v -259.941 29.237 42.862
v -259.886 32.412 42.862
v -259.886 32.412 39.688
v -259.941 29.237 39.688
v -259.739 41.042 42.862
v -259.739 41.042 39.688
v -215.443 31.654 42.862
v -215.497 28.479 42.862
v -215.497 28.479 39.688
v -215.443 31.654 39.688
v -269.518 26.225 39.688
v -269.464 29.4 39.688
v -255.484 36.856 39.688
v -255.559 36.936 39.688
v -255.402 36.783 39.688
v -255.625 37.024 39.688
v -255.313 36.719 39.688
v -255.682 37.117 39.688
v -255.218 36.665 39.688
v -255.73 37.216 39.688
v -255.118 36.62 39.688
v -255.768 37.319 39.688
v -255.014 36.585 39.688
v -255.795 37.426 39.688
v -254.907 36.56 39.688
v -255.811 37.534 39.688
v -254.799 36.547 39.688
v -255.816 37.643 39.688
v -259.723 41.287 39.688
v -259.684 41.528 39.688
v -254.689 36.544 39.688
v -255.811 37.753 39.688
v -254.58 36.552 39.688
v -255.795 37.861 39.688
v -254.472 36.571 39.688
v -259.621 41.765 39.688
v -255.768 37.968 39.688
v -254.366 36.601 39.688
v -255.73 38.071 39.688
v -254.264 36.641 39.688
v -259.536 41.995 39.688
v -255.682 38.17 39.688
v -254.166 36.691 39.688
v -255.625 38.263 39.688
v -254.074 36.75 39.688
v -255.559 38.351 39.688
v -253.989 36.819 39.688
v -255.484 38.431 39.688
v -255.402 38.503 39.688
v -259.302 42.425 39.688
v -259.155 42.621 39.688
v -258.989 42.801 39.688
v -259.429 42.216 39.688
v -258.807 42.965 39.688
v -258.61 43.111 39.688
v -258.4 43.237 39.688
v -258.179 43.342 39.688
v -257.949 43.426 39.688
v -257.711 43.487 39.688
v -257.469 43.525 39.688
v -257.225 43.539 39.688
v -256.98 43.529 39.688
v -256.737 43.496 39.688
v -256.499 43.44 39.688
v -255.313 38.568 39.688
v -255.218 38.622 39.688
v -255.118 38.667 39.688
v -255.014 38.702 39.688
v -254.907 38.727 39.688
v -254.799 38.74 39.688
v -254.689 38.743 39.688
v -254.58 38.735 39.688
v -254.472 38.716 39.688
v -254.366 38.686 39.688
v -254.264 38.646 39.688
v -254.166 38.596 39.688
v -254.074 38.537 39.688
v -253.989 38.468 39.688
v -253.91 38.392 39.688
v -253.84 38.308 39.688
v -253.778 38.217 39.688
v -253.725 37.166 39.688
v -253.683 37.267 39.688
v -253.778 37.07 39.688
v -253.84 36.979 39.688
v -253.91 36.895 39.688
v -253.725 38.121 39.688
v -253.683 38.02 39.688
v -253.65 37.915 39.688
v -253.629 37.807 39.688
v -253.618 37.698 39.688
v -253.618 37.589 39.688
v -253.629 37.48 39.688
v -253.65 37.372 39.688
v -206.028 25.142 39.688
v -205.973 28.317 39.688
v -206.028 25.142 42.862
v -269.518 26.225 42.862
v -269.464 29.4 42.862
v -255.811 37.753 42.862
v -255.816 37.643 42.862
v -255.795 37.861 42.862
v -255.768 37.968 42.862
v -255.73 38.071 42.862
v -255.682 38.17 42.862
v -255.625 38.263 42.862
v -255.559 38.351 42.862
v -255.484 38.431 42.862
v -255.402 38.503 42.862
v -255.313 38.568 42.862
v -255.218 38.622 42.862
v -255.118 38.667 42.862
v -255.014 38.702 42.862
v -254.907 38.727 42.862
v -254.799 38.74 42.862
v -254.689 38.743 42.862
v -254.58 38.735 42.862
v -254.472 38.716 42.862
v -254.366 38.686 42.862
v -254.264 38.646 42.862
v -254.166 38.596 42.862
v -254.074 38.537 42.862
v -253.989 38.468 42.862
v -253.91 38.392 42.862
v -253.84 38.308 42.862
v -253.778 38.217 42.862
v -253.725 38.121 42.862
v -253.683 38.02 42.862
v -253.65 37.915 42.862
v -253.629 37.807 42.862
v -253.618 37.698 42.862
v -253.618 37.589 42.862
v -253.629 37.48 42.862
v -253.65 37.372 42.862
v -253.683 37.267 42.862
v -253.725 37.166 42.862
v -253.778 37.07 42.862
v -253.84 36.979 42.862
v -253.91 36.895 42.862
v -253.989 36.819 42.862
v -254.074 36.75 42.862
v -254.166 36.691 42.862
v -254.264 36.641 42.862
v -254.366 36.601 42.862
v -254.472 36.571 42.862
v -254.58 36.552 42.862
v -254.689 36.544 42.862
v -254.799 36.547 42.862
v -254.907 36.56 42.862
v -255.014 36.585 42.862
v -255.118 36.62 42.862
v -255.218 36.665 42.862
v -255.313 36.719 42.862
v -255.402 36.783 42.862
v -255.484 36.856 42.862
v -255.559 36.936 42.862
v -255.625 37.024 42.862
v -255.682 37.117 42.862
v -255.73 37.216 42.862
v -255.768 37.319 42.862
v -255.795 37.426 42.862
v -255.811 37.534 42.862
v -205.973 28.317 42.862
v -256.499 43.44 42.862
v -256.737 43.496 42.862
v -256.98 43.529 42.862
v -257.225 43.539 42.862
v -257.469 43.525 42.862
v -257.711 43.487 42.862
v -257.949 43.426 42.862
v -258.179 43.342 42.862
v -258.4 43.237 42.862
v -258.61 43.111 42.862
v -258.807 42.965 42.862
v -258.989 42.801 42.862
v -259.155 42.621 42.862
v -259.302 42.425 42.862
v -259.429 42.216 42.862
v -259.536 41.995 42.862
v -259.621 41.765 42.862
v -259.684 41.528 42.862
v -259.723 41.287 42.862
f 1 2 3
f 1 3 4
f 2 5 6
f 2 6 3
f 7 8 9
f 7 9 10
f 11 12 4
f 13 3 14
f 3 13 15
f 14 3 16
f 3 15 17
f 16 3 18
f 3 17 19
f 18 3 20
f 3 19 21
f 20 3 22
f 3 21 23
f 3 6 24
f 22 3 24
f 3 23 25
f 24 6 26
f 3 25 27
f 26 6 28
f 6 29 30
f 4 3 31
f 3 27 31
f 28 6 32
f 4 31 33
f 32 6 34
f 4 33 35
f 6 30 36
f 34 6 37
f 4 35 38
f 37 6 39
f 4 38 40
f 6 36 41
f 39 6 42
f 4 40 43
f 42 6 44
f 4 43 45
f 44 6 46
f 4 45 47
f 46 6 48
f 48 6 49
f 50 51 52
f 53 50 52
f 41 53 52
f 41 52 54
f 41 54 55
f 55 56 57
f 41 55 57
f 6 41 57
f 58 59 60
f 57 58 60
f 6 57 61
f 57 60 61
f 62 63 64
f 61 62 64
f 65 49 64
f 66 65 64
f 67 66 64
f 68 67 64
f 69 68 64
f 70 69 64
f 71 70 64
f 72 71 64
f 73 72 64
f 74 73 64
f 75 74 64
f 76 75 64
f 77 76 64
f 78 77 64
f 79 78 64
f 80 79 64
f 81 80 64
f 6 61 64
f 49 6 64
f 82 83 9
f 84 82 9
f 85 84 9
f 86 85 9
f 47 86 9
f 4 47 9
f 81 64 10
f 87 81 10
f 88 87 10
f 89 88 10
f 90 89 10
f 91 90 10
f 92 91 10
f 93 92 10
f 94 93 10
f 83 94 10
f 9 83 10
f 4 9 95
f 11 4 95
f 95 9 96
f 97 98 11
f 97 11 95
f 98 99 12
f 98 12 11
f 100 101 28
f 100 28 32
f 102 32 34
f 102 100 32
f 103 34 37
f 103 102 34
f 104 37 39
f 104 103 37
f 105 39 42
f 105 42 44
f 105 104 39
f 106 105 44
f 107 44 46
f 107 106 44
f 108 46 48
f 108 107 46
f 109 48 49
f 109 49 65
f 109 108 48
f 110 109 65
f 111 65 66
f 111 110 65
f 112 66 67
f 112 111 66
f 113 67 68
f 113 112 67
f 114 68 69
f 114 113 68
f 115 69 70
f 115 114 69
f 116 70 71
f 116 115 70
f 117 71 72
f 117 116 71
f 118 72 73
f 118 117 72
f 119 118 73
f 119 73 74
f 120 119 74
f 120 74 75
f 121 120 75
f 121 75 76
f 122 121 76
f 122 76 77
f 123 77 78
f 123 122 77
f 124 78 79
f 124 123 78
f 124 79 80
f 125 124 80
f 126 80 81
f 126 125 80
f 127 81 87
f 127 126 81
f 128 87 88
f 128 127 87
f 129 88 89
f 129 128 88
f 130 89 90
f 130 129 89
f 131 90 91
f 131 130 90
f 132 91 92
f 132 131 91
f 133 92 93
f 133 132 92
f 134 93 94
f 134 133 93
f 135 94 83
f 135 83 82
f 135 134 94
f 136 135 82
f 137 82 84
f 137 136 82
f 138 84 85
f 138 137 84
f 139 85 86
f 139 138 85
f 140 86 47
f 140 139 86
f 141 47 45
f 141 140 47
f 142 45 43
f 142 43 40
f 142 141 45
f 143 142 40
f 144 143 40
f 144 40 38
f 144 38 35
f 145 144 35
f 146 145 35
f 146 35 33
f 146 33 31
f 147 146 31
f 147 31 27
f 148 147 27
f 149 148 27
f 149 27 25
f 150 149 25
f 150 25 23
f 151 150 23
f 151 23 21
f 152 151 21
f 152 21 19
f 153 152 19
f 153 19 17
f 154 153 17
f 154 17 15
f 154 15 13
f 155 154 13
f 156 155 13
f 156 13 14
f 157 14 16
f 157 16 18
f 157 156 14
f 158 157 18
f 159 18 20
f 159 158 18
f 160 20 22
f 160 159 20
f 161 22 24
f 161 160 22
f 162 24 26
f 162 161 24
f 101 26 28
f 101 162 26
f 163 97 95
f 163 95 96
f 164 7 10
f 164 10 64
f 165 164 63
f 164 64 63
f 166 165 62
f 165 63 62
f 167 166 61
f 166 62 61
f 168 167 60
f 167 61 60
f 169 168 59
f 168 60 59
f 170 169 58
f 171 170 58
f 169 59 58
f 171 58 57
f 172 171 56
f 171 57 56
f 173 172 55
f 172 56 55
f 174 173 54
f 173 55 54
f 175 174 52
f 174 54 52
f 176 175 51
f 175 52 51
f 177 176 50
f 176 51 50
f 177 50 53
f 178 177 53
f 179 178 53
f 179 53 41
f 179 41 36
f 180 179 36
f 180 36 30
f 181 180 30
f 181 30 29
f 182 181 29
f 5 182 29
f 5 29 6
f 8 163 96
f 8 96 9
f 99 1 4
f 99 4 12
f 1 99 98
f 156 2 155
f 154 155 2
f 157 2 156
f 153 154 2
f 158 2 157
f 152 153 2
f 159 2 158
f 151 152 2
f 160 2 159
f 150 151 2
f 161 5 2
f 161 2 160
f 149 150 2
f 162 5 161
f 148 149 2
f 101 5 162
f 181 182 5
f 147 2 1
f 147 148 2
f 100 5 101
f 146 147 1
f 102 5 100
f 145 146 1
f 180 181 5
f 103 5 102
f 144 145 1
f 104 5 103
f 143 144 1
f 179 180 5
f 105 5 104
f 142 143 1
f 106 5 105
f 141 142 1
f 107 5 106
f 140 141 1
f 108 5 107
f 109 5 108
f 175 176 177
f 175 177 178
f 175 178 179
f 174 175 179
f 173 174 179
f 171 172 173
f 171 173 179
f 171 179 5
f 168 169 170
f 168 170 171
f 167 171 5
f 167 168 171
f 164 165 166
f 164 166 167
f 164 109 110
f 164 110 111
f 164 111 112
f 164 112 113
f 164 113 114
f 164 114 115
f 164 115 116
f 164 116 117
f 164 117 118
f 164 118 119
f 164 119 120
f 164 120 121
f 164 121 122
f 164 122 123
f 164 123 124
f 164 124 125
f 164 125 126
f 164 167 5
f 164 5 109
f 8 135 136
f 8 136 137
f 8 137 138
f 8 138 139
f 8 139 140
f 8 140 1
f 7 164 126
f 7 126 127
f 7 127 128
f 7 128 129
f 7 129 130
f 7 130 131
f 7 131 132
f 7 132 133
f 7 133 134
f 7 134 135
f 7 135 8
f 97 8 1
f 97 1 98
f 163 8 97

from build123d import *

# Parameters (mm, degrees)
BOSS_EXTRUDE2_DEPTH      = 1.5875
BOSS_EXTRUDE2_DEPTH_BACK = 1.5875
SKETCH4_R                = 1.1
FILLET2_R                = 2.54


with BuildPart() as part:
    # Sketch4 → Boss-Extrude2 (new, two sides: drawn at the far end of the back side and taken through both)
    with BuildSketch(Plane(origin=(0, 0, 41.275), x_dir=(-1, 0, 0), z_dir=(0, 0, -1)).offset(-BOSS_EXTRUDE2_DEPTH_BACK)):
        Polygon((205.973378569, 28.316894771), (215.496993412, 28.479330378), (215.442840335, 31.654330378), (259.682693032, 44.354330378), (259.886376268, 32.412363209), (259.940529345, 29.237363209), (269.464144188, 29.399798816), (269.51828939, 26.225260535), (206.027523772, 25.14235649), align=None)
        with Locations((254.716415099, 37.643475636)):
            Circle(SKETCH4_R, mode=Mode.SUBTRACT)
    extrude(amount=BOSS_EXTRUDE2_DEPTH + BOSS_EXTRUDE2_DEPTH_BACK)

    # Fillet2
    fillet2_edges = [part.edges().sort_by_distance(p)[0] for p in [
        (-259.682693032, 44.354330378, 41.275),
    ]]
    fillet(fillet2_edges, radius=FILLET2_R)


solid = part.part
